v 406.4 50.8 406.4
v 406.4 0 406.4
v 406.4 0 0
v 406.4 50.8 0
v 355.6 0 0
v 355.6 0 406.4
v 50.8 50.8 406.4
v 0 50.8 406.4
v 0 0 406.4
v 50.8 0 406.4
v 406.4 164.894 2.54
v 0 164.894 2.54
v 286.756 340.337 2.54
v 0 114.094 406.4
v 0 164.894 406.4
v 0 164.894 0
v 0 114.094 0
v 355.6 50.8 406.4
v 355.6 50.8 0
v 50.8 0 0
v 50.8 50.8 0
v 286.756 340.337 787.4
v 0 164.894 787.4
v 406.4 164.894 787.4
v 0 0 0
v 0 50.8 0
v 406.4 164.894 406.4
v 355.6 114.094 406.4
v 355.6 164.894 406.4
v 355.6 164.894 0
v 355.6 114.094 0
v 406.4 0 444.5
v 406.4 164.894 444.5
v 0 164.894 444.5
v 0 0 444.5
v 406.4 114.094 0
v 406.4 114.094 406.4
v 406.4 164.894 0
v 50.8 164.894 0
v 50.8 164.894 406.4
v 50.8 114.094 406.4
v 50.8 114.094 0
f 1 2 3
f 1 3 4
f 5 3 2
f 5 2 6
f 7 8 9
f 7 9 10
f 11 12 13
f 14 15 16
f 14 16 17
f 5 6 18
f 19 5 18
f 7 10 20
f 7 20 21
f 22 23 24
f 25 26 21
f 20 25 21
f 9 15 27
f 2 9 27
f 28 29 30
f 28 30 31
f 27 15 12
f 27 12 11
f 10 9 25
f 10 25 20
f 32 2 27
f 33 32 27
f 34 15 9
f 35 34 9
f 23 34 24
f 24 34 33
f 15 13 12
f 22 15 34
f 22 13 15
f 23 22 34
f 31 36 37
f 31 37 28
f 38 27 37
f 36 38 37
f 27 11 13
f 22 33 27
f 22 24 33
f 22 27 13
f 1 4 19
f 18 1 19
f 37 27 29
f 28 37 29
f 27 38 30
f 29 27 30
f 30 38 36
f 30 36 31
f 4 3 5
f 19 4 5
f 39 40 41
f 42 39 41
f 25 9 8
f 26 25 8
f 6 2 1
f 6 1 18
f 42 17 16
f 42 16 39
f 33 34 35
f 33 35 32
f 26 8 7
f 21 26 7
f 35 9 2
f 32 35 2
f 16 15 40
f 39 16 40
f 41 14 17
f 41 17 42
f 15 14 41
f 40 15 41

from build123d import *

# Parameters (mm, degrees)
F0_W          = 50.8
F0_H          = 50.8
F1_DEPTH      = 406.4
F2_W          = 203.2
F2_H          = 82.4469551444
F2_W_2        = 50.8
F2_H_2        = 50.8
F7_DEPTH      = 38.1
F9_DEPTH      = 342.9
F9_DEPTH_BACK = 441.96


# Not quite as in the source:
# - a feature names something its author has since deleted; it is built from what else it names


with BuildPart() as f1:
    # F0 (on Top) → F1 (new body)
    with BuildSketch(Plane.XY):
        with Locations((25.4, 25.4)):
            Rectangle(F0_W, F0_H)
    extrude(amount=F1_DEPTH)


with BuildPart() as f5_1:
    # F5: instance of F1
    add(f1.part.mirror(Plane.XZ.offset(-82.4469551444)))


with BuildPart() as f6_1:
    # F6: instance of F5_1
    add(f5_1.part.mirror(Plane.YZ.offset(203.2)))


with BuildPart() as f6_2:
    # F6: instance of F1
    add(f1.part.mirror(Plane.YZ.offset(203.2)))


with BuildPart() as f7:
    # F2 (on face) → F7 (new body)
    with BuildSketch(Plane.XY.offset(406.4)):
        with Locations((304.8, 41.2234775722)):
            Rectangle(F2_W, F2_H)
        with Locations((101.6, 123.6704327166)):
            Rectangle(F2_W, F2_H)
        Polygon((50.8, 50.8), (50.8, 0), (203.2, 0), (203.2, 82.4469551444), (0, 82.4469551444), (0, 50.8), align=None)
        with Locations((304.8, 123.6704327166)):
            Rectangle(F2_W, F2_H)
        with Locations((25.4, 25.4)):
            Rectangle(F2_W_2, F2_H_2)
    extrude(amount=F7_DEPTH)

    # F8 (on face) → F9 (join, two sides)
    with BuildSketch(Plane.XY.offset(444.5)) as f9_sk:
        Polygon((286.7561876774, 340.3366804123), (0, 164.8939102888), (406.4, 164.8939102888), align=None)
    extrude(amount=F9_DEPTH)
    extrude(f9_sk.sketch, amount=-F9_DEPTH_BACK)


solid = Compound([f1.part, f5_1.part, f6_1.part, f6_2.part, f7.part])
